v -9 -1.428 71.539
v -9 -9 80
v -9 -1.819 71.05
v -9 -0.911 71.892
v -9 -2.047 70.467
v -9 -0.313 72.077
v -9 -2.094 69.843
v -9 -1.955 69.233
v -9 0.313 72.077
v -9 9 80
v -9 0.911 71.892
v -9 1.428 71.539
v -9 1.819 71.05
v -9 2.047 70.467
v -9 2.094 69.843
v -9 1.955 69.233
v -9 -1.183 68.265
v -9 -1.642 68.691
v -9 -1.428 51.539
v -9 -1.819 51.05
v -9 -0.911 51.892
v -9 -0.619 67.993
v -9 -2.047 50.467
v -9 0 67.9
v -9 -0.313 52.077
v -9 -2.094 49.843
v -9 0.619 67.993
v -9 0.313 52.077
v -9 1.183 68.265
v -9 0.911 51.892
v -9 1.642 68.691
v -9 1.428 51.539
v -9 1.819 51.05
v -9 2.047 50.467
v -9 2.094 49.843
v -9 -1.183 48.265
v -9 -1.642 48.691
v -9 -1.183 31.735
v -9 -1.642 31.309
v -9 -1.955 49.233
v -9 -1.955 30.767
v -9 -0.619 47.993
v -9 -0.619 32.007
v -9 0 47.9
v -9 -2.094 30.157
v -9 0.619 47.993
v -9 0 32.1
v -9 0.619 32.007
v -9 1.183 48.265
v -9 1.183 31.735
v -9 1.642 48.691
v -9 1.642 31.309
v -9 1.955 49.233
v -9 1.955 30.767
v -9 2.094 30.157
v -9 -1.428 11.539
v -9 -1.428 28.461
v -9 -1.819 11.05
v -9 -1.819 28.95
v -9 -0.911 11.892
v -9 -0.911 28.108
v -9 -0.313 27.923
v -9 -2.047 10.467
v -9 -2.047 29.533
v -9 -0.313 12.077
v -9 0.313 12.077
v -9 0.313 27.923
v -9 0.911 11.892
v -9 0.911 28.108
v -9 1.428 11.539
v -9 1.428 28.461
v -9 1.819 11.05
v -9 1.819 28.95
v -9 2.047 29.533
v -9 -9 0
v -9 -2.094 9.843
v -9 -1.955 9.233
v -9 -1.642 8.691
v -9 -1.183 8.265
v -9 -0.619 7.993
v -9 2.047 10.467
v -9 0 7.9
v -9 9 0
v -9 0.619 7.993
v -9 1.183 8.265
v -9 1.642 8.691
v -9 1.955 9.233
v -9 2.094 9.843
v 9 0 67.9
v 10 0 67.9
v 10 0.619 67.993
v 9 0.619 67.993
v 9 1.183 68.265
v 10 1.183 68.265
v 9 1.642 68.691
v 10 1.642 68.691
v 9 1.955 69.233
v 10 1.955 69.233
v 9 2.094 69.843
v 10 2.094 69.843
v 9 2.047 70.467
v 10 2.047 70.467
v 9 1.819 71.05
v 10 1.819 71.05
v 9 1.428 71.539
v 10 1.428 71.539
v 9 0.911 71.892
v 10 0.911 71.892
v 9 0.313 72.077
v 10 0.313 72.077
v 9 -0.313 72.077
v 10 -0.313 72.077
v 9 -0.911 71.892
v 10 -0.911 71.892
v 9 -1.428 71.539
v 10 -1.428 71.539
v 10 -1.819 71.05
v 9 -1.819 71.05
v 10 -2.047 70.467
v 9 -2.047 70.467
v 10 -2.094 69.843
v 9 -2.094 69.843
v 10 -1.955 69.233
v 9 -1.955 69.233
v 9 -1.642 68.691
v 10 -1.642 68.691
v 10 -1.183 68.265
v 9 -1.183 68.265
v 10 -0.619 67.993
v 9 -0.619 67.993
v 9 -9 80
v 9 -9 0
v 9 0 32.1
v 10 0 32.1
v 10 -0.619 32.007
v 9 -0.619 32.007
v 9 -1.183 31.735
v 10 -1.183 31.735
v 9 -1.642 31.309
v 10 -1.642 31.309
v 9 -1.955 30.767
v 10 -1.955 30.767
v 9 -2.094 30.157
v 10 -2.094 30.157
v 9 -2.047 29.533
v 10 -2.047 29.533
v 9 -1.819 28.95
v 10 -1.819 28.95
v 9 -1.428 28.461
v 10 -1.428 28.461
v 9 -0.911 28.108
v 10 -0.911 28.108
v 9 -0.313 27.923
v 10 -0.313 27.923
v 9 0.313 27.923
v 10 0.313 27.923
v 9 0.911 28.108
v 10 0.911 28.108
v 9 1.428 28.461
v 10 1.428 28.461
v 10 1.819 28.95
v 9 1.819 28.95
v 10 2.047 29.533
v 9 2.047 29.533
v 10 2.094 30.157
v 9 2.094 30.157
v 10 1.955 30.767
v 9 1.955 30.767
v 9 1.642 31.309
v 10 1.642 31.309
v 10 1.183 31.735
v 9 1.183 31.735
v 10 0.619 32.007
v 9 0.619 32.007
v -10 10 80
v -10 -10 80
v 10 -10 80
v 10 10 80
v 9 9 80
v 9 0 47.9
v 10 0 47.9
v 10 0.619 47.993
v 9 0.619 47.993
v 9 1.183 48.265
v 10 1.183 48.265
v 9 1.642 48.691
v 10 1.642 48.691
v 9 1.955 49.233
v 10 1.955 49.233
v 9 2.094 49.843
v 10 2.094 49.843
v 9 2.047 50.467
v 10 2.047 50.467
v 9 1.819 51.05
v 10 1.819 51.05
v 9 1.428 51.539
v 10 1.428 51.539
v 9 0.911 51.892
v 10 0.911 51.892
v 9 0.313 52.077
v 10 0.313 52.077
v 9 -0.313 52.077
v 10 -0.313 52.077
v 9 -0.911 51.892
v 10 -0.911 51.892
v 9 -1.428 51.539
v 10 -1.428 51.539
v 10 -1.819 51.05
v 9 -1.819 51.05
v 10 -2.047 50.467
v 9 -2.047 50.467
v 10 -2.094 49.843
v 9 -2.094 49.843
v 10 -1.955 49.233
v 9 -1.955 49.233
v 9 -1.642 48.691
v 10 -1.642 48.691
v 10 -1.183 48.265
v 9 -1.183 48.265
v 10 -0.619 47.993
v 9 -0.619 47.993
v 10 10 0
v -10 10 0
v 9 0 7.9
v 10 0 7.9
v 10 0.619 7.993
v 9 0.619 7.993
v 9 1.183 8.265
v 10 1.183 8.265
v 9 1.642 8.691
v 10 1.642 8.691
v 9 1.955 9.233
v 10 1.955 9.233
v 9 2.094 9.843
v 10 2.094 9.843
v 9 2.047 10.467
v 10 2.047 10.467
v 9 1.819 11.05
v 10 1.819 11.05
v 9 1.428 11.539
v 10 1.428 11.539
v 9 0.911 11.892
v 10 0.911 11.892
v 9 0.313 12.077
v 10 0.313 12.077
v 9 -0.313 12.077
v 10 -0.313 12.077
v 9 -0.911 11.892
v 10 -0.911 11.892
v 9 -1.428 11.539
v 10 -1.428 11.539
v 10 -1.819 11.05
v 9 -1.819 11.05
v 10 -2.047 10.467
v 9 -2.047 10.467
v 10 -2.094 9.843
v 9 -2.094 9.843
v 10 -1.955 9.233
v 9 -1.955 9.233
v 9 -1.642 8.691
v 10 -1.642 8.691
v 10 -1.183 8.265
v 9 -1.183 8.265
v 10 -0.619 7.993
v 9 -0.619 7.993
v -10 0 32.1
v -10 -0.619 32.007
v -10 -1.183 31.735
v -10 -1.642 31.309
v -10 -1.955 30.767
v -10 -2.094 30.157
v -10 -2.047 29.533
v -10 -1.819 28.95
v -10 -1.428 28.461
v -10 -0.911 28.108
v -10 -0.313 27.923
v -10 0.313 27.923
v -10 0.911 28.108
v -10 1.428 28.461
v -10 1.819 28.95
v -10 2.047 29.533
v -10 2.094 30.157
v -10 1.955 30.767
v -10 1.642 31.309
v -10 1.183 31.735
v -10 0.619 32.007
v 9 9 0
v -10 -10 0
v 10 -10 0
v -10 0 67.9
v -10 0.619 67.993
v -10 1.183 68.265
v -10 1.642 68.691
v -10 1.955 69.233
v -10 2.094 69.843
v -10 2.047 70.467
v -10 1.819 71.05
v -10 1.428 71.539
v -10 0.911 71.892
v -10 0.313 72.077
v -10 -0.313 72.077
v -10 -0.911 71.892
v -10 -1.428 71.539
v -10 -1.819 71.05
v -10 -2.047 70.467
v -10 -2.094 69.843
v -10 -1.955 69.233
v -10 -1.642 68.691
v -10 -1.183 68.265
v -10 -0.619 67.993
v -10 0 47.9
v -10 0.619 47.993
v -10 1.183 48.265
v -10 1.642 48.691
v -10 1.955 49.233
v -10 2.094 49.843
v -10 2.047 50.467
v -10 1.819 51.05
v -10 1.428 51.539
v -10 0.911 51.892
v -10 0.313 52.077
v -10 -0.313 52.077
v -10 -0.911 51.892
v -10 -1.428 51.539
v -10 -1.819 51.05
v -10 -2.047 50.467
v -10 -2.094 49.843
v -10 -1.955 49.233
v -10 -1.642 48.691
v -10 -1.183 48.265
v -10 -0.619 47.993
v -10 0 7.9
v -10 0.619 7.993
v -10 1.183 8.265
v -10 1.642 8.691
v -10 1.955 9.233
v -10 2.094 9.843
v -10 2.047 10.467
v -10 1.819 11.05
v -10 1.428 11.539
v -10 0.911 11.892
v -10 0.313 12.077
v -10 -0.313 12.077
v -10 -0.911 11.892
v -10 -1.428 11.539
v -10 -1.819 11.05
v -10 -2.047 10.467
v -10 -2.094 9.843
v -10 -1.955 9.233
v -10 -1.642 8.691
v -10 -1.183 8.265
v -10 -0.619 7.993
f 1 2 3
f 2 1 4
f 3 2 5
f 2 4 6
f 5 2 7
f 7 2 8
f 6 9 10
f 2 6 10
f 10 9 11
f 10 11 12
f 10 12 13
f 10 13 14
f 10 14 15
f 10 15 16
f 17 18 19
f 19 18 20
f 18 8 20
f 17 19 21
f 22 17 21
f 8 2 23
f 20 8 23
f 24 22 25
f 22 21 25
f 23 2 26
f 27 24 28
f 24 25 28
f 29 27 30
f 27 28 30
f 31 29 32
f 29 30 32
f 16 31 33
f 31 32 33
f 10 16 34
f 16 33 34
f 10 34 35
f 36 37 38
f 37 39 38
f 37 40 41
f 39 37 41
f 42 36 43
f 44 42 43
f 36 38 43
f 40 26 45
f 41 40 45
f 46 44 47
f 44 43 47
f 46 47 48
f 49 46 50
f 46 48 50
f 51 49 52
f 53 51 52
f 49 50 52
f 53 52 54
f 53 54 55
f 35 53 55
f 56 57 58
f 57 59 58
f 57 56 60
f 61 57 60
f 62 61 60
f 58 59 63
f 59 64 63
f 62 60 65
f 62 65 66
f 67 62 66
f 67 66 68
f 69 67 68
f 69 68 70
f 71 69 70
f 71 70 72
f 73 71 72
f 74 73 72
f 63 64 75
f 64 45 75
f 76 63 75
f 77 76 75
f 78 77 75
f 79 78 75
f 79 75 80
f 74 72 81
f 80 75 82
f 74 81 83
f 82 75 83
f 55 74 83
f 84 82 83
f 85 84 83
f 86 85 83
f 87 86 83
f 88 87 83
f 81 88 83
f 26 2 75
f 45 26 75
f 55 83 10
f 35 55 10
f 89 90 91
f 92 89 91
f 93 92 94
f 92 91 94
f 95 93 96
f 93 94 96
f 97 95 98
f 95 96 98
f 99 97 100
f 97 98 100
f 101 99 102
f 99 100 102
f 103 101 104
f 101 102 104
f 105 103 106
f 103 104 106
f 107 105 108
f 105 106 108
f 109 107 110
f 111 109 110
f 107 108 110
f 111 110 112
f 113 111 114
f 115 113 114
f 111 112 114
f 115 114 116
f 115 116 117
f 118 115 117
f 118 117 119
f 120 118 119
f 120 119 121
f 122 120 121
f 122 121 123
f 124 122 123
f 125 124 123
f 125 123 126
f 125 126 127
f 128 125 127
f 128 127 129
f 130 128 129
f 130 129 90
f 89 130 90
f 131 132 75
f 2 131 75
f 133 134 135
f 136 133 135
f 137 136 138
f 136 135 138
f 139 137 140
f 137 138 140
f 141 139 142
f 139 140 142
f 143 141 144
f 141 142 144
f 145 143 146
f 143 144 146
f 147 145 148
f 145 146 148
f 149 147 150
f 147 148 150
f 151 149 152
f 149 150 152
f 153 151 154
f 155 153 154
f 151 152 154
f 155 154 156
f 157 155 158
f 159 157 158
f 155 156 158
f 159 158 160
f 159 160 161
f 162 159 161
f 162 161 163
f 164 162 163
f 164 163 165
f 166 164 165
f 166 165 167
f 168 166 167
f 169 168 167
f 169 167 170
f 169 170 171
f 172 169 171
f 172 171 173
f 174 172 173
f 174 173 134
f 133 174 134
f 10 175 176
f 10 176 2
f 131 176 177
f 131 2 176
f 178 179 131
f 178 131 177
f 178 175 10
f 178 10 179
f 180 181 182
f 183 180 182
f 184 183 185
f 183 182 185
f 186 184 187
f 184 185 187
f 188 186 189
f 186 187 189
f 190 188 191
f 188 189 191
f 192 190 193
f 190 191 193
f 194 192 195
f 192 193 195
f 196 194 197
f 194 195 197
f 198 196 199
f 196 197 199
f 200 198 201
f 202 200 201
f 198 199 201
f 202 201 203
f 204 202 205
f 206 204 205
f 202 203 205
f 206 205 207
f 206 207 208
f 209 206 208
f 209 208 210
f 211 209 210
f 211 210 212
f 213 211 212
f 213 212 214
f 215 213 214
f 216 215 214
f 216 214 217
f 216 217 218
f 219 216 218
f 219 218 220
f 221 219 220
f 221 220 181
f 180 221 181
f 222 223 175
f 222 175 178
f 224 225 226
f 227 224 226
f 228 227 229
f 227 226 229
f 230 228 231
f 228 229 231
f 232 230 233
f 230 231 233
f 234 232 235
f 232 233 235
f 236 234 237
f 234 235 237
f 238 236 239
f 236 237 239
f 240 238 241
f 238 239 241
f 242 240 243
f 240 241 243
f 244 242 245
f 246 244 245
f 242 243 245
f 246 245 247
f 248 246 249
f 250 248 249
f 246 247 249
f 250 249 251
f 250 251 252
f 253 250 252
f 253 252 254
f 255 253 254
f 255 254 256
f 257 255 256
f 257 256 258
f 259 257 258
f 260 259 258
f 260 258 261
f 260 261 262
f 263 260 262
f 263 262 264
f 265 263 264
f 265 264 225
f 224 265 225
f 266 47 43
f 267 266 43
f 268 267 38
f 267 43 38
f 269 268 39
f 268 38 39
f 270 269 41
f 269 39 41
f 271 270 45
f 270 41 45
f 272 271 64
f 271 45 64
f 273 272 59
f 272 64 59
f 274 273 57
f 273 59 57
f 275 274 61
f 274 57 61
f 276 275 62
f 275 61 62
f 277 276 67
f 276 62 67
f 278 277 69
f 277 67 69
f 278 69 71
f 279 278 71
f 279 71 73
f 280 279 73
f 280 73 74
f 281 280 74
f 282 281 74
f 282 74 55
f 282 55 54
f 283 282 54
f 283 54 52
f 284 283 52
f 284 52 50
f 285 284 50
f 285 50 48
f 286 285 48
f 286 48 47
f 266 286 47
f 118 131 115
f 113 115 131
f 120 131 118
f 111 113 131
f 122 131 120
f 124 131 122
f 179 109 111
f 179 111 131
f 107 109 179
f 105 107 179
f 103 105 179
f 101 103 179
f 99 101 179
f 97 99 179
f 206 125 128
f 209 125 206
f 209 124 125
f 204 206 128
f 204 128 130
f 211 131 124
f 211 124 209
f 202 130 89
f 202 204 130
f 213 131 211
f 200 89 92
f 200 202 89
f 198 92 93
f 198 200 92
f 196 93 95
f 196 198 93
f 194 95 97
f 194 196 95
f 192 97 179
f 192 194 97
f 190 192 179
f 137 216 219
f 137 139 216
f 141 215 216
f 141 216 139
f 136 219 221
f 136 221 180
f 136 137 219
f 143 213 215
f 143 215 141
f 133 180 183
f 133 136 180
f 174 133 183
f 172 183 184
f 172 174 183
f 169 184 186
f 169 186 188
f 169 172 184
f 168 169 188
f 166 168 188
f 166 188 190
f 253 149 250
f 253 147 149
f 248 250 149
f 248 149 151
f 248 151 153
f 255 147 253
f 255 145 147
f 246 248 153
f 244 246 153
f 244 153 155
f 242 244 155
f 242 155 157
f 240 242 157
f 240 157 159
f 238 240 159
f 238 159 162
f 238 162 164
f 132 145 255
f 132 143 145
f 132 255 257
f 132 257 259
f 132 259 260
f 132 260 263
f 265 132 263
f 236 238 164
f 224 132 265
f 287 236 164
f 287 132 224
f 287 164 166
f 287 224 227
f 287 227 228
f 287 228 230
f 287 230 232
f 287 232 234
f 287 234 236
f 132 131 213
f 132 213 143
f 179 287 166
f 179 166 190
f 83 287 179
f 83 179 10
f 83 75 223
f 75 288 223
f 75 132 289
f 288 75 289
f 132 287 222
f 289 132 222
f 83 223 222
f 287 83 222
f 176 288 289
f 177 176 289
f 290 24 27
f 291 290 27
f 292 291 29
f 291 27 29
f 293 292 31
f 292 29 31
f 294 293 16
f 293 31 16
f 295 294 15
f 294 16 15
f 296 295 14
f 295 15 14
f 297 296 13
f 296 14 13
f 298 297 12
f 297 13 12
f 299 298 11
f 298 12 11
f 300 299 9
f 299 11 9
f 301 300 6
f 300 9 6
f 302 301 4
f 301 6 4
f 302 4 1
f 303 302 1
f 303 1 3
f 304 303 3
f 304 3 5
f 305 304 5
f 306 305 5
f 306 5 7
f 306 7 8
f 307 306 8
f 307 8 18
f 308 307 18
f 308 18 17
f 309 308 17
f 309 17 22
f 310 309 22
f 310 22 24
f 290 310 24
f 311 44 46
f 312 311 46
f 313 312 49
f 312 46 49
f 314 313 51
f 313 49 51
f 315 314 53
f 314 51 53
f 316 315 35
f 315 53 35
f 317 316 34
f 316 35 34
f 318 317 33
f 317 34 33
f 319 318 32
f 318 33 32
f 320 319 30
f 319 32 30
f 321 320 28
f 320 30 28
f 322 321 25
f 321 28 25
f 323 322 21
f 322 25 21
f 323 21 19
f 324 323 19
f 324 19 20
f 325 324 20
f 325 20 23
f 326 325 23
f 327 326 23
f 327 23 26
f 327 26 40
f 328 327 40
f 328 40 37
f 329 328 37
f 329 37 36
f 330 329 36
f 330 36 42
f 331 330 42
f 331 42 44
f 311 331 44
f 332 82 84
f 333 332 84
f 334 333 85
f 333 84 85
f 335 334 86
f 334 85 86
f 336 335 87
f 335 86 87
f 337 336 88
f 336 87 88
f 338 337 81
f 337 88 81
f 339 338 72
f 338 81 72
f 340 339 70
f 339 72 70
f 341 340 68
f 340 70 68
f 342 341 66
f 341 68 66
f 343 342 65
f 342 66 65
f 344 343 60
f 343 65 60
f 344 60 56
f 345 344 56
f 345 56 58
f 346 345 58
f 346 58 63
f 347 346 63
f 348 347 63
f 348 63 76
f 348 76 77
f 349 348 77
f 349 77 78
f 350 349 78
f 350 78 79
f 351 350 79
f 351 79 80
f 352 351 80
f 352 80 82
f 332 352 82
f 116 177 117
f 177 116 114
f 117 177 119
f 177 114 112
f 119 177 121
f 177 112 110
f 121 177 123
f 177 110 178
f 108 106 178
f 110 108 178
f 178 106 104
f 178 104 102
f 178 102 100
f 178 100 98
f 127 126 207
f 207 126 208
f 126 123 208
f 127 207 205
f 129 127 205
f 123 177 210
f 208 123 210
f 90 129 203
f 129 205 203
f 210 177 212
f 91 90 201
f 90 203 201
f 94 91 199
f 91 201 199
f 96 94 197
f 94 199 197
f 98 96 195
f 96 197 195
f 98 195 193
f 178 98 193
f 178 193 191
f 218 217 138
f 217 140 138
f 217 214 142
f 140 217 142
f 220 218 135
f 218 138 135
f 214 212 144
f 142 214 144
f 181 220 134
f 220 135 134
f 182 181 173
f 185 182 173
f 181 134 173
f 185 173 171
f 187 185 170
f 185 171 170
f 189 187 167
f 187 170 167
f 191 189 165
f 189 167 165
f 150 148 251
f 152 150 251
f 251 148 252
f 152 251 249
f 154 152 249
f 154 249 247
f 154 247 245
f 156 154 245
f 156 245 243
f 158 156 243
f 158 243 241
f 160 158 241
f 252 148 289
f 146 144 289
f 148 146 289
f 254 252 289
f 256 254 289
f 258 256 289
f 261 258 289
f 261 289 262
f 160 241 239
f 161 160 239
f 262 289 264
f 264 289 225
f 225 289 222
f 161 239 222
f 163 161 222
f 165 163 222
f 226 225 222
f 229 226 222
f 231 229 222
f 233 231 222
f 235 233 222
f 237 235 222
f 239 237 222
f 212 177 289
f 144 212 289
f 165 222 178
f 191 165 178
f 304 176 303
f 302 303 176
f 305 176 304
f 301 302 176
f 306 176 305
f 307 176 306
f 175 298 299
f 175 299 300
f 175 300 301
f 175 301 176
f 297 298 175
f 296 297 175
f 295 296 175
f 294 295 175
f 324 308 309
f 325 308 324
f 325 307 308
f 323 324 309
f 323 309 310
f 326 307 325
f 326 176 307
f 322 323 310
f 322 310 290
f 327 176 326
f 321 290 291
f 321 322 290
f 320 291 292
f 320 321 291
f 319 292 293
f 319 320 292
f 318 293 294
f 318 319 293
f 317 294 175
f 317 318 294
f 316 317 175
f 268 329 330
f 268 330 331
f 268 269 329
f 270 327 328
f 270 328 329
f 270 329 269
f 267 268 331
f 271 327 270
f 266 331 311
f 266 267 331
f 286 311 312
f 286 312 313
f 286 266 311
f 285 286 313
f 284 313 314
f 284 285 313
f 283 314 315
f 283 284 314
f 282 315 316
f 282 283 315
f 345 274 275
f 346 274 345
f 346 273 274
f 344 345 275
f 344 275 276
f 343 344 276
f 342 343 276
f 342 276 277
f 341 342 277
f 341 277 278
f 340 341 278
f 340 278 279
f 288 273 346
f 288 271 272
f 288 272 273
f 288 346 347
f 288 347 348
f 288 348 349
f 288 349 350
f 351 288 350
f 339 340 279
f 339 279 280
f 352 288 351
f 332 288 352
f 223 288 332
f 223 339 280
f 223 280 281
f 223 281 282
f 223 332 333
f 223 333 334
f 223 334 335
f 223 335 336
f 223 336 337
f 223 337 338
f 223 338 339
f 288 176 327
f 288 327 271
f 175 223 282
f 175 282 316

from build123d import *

# Parameters (mm, degrees)
SKETCH_1_W          = 20
SKETCH_1_H          = 20
EXTRUDE_1_DEPTH     = 80
SKETCH_2_R          = 2.1
CUT_EXTRUDE_1_DEPTH = 84.066238629
SKETCH_3_W          = 18
SKETCH_3_H          = 18
CUT_EXTRUDE_2_DEPTH = 82.240384046


with BuildPart() as part:
    # 草图1 → 凸台-拉伸1 (new body)
    with BuildSketch(Plane.XY):
        Rectangle(SKETCH_1_W, SKETCH_1_H)
    extrude(amount=EXTRUDE_1_DEPTH)

    # 草图2 → 切除-拉伸1 (cut, through all)
    with BuildSketch(Plane(origin=(10, 0, 0), x_dir=(0, 0, -1), z_dir=(1, 0, 0))):
        with Locations((-70, 0)):
            Circle(SKETCH_2_R)
        with Locations((-10, 0)):
            Circle(SKETCH_2_R)
        with Locations((-50, 0)):
            Circle(SKETCH_2_R)
        with Locations(Location((-30, 0, 0), (0, 0, 180))):
            Circle(SKETCH_2_R)
    extrude(amount=-CUT_EXTRUDE_1_DEPTH, mode=Mode.SUBTRACT)

    # 草图3 → 切除-拉伸2 (cut, through all)
    with BuildSketch(Plane(origin=(0, 0, 0), x_dir=(-1, 0, 0), z_dir=(0, 0, -1))):
        Rectangle(SKETCH_3_W, SKETCH_3_H)
    extrude(amount=-CUT_EXTRUDE_2_DEPTH, mode=Mode.SUBTRACT)


solid = part.part
